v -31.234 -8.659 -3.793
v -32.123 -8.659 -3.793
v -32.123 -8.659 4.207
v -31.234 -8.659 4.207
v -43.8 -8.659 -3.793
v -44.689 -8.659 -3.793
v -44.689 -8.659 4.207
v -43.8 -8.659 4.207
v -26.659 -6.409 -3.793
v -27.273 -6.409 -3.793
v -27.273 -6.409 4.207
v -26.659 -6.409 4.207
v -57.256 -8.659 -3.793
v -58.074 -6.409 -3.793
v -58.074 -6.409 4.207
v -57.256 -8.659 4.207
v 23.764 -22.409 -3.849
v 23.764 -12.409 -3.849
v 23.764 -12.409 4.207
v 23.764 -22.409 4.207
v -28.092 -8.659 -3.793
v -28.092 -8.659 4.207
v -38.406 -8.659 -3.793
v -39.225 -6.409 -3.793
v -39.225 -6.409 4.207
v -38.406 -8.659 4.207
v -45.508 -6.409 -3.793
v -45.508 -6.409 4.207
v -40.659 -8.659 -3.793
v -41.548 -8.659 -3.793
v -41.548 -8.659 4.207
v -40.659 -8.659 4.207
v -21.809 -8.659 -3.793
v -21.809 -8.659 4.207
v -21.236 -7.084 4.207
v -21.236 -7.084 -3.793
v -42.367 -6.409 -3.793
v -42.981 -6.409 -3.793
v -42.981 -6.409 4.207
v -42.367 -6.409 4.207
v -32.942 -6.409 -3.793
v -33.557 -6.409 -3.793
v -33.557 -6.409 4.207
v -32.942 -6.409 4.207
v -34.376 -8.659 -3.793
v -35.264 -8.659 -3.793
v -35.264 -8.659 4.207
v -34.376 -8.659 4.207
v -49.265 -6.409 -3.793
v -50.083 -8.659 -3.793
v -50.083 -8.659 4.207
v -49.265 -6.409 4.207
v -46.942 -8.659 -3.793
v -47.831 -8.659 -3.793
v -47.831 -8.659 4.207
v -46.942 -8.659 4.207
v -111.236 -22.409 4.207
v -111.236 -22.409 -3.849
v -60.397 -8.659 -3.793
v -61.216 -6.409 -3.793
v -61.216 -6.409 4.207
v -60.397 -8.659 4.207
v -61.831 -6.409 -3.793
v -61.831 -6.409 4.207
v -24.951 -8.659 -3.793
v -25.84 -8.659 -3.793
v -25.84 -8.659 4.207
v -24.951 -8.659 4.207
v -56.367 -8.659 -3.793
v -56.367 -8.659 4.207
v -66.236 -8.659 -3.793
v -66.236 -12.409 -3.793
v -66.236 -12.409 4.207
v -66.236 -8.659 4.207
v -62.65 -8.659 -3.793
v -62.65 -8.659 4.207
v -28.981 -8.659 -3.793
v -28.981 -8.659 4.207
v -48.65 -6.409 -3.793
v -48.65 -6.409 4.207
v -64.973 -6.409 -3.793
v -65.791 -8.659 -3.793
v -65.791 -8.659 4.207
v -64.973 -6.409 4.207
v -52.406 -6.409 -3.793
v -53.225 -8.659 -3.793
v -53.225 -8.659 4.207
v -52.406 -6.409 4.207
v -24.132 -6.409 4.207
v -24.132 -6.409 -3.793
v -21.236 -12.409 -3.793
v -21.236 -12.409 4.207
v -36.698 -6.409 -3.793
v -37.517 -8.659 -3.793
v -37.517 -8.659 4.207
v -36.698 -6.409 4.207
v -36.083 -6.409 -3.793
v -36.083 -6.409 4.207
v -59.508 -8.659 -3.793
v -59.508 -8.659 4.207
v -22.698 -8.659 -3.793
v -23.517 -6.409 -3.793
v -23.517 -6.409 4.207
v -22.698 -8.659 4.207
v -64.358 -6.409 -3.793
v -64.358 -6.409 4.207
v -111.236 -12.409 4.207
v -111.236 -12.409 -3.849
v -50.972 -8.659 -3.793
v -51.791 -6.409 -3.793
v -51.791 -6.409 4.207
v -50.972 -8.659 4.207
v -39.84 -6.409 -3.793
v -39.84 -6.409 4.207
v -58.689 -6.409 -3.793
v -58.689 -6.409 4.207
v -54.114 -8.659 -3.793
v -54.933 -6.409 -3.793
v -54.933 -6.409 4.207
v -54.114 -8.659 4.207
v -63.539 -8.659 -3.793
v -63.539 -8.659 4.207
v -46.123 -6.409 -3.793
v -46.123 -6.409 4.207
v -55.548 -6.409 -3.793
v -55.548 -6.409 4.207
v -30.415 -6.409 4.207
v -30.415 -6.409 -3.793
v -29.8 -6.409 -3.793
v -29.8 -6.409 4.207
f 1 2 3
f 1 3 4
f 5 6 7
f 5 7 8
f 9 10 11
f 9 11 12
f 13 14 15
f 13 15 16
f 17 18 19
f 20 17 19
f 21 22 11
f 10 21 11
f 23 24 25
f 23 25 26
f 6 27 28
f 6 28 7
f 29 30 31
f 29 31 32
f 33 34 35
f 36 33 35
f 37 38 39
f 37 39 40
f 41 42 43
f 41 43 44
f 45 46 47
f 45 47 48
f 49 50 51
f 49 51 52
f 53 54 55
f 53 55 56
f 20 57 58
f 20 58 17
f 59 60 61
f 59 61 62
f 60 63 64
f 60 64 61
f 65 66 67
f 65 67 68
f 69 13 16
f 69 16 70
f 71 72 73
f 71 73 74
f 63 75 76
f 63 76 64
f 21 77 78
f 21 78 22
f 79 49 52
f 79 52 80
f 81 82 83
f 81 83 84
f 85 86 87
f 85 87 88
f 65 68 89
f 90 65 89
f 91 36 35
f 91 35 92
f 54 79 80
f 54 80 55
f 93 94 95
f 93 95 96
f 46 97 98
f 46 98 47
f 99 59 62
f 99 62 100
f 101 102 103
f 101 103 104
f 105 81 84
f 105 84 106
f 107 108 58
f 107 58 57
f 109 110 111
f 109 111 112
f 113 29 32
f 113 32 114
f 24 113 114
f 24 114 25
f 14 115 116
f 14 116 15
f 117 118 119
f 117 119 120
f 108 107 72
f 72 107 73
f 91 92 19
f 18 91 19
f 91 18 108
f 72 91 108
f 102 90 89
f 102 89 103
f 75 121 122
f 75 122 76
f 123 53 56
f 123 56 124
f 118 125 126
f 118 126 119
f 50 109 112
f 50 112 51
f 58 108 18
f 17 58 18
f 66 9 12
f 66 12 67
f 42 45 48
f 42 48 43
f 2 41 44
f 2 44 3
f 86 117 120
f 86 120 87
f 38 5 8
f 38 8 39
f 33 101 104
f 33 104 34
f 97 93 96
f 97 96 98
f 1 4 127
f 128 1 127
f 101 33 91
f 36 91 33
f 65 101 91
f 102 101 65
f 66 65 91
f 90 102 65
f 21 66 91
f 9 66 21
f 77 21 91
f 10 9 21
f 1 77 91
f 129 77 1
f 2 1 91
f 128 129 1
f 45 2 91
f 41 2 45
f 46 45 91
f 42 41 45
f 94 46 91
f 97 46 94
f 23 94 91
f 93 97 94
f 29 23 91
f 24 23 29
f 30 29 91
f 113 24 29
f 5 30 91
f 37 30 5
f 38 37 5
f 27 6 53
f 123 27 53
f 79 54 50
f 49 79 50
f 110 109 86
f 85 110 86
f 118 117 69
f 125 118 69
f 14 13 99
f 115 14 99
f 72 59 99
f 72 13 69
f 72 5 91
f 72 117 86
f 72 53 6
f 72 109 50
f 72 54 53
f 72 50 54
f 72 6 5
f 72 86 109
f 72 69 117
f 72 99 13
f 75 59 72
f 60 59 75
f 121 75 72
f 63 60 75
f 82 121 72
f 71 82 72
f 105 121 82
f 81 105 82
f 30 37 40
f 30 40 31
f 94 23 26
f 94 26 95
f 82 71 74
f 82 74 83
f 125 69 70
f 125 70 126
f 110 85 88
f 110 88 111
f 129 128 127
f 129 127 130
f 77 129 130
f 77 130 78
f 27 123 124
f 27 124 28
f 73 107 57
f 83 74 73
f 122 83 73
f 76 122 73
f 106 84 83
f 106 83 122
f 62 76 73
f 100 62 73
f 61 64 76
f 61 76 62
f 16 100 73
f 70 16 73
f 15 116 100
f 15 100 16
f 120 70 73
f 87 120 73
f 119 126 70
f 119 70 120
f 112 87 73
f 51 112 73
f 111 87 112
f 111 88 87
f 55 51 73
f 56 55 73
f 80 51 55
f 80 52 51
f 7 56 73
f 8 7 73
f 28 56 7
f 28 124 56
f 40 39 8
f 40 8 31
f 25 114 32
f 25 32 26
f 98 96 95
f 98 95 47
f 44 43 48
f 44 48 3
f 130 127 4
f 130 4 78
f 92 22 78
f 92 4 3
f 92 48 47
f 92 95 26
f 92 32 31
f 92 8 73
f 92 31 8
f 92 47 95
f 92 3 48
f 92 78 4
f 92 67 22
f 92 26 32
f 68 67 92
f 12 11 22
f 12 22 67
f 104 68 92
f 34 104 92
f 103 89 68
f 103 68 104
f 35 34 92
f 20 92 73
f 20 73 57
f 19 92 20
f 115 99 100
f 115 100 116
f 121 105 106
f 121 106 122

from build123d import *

# Parameters (mm, degrees)
BOSS_EXTRUDE1_DEPTH = 8
SKETCH2_W           = 135
SKETCH2_H           = 8.056190957
BOSS_EXTRUDE2_DEPTH = 10


with BuildPart() as part:
    # Sketch1 → Boss-Extrude1 (new body)
    with BuildSketch(Plane(origin=(0, 0, -3.792826984), x_dir=(-1, 0, 0), z_dir=(0, 0, -1))):
        Polygon((23.516961809, -6.40864854), (22.698028781, -8.65864854), (21.809158042, -8.65864854), (21.235890512, -7.083608945), (21.235890512, -12.40864854), (66.235890512, -12.40864854), (66.235890512, -8.65864854), (65.791455142, -8.65864854), (64.972522115, -6.40864854), (64.357666259, -6.40864854), (63.538733231, -8.65864854), (62.649862492, -8.65864854), (61.830929465, -6.40864854), (61.216073609, -6.40864854), (60.397140581, -8.65864854), (59.508269842, -8.65864854), (58.689336815, -6.40864854), (58.074480959, -6.40864854), (57.255547931, -8.65864854), (56.366677192, -8.65864854), (55.547744165, -6.40864854), (54.932888309, -6.40864854), (54.113955281, -8.65864854), (53.225084542, -8.65864854), (52.406151515, -6.40864854), (51.791295659, -6.40864854), (50.972362631, -8.65864854), (50.083491892, -8.65864854), (49.264558865, -6.40864854), (48.649703009, -6.40864854), (47.830769981, -8.65864854), (46.941899242, -8.65864854), (46.122966215, -6.40864854), (45.508110359, -6.40864854), (44.689177331, -8.65864854), (43.800306592, -8.65864854), (42.981373565, -6.40864854), (42.366517709, -6.40864854), (41.547584681, -8.65864854), (40.658713942, -8.65864854), (39.839780915, -6.40864854), (39.224925059, -6.40864854), (38.405992031, -8.65864854), (37.517121292, -8.65864854), (36.698188265, -6.40864854), (36.083332409, -6.40864854), (35.264399381, -8.65864854), (34.375528642, -8.65864854), (33.556595615, -6.40864854), (32.941739759, -6.40864854), (32.122806731, -8.65864854), (31.233935992, -8.65864854), (30.415002965, -6.40864854), (29.800147109, -6.40864854), (28.981214081, -8.65864854), (28.092343342, -8.65864854), (27.273410315, -6.40864854), (26.658554459, -6.40864854), (25.839621431, -8.65864854), (24.950750692, -8.65864854), (24.131817665, -6.40864854), align=None)
    extrude(amount=-BOSS_EXTRUDE1_DEPTH)

    # Sketch2 → Boss-Extrude2 (add)
    with BuildSketch(Plane.XZ.offset(12.40864854)):
        with Locations((-43.735890512, 0.179077538)):
            Rectangle(SKETCH2_W, SKETCH2_H)
    extrude(amount=BOSS_EXTRUDE2_DEPTH)


solid = part.part
